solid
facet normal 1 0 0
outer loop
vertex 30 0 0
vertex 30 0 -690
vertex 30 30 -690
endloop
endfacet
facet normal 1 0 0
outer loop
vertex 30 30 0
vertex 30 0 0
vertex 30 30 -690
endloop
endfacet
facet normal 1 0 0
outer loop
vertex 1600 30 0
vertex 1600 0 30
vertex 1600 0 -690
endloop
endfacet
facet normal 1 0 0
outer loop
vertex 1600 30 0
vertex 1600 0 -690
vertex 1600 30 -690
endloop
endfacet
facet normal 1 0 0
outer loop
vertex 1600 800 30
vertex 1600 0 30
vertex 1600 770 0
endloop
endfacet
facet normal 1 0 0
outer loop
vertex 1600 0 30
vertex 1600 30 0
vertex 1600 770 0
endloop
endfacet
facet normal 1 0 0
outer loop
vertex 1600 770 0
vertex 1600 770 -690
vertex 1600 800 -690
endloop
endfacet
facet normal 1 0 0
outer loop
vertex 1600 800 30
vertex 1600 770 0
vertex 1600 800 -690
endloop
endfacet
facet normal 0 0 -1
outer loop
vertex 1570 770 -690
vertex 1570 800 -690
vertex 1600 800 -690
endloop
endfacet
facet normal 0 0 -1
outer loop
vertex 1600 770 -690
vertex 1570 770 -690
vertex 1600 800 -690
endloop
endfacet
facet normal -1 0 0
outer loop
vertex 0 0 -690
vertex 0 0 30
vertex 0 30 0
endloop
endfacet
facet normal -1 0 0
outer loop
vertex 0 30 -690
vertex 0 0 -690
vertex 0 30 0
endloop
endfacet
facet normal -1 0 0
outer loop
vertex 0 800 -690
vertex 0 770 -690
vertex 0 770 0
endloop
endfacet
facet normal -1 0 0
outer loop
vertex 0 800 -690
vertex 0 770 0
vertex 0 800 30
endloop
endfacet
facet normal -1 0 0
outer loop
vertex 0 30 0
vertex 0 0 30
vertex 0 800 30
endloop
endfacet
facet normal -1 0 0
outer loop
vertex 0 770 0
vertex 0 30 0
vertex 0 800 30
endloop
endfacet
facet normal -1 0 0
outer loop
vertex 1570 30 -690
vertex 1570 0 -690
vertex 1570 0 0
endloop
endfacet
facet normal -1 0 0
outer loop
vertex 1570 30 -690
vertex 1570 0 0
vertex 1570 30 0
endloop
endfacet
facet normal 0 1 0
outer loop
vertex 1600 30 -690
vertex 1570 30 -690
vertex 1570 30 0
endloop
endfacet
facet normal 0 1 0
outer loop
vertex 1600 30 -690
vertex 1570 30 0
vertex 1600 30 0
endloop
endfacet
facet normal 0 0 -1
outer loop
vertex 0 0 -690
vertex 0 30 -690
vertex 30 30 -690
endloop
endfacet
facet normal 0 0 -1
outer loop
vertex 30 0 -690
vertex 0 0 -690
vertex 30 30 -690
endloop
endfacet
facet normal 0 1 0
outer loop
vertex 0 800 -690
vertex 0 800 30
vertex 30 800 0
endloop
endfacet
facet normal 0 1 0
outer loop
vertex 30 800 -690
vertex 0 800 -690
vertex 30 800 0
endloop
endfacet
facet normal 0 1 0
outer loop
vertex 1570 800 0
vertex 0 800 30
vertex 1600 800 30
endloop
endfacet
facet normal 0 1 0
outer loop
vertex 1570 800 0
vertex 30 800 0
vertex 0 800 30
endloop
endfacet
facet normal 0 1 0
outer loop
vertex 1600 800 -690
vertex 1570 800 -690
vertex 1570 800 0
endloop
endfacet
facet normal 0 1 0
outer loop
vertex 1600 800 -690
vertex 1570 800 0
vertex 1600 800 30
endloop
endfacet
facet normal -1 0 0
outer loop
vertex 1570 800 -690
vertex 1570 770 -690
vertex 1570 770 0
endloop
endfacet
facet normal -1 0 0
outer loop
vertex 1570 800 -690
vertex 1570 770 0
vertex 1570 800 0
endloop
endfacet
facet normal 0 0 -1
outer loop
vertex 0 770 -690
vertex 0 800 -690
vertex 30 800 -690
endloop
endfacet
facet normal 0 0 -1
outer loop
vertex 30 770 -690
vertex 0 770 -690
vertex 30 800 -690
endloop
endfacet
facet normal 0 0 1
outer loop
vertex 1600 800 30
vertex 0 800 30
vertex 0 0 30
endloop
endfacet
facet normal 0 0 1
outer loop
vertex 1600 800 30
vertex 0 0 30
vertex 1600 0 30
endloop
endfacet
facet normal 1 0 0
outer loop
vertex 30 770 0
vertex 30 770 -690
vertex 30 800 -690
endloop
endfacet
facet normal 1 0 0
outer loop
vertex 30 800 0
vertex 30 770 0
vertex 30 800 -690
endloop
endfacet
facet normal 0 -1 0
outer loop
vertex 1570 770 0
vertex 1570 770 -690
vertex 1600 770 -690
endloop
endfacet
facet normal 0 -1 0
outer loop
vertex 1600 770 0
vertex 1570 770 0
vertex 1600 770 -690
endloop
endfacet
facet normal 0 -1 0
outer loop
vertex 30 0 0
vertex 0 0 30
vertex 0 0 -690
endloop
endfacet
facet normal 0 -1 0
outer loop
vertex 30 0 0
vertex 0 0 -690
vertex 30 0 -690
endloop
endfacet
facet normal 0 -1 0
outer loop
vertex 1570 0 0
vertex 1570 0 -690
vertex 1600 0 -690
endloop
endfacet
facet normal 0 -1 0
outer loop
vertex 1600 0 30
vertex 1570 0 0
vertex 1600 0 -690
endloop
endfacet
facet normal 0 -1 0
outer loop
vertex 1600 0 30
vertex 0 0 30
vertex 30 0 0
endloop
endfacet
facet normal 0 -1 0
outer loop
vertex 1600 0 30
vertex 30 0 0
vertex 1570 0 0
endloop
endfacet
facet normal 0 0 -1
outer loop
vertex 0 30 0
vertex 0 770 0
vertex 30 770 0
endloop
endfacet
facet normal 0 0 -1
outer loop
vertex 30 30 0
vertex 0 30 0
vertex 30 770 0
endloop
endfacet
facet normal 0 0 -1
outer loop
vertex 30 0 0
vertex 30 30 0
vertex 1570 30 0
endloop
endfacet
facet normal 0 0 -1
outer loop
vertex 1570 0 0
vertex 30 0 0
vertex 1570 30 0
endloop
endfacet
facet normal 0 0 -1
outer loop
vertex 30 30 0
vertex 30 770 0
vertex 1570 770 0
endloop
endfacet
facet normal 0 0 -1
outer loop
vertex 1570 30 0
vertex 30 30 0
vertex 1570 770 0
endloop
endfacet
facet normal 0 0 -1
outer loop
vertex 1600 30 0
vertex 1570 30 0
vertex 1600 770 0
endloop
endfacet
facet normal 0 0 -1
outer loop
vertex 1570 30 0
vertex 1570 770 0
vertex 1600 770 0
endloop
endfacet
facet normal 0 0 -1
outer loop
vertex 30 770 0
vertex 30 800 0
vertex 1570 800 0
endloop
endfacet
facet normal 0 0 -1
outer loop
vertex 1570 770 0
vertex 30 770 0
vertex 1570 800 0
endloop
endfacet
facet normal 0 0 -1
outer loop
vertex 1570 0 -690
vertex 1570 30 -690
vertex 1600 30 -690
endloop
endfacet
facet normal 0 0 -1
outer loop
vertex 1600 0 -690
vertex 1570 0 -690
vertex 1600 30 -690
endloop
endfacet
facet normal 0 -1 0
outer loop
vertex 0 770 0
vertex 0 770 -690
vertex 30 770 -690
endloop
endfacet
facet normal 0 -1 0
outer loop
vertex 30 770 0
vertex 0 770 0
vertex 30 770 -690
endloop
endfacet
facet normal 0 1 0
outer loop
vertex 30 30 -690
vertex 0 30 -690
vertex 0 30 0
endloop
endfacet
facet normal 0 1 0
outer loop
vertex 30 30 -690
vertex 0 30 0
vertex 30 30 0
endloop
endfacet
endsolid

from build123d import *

# Parameters (mm, degrees)
F0_W     = 1600
F0_H     = 800
F1_DEPTH = 30
F2_W     = 30
F2_H     = 30
F3_DEPTH = 690


with BuildPart() as f1:
    # F0 (on Top) → F1 (new body)
    with BuildSketch(Plane.XY):
        with Locations((800, 400)):
            Rectangle(F0_W, F0_H)
    extrude(amount=F1_DEPTH)

    # F2 (on Top) → F3 (join)
    with BuildSketch(Plane.XY):
        with Locations((15, 15)):
            Rectangle(F2_W, F2_H)
        with Locations((15, 785)):
            Rectangle(F2_W, F2_H)
        with Locations((1585, 15)):
            Rectangle(F2_W, F2_H)
        with Locations((1585, 785)):
            Rectangle(F2_W, F2_H)
    extrude(amount=-F3_DEPTH)


solid = f1.part
